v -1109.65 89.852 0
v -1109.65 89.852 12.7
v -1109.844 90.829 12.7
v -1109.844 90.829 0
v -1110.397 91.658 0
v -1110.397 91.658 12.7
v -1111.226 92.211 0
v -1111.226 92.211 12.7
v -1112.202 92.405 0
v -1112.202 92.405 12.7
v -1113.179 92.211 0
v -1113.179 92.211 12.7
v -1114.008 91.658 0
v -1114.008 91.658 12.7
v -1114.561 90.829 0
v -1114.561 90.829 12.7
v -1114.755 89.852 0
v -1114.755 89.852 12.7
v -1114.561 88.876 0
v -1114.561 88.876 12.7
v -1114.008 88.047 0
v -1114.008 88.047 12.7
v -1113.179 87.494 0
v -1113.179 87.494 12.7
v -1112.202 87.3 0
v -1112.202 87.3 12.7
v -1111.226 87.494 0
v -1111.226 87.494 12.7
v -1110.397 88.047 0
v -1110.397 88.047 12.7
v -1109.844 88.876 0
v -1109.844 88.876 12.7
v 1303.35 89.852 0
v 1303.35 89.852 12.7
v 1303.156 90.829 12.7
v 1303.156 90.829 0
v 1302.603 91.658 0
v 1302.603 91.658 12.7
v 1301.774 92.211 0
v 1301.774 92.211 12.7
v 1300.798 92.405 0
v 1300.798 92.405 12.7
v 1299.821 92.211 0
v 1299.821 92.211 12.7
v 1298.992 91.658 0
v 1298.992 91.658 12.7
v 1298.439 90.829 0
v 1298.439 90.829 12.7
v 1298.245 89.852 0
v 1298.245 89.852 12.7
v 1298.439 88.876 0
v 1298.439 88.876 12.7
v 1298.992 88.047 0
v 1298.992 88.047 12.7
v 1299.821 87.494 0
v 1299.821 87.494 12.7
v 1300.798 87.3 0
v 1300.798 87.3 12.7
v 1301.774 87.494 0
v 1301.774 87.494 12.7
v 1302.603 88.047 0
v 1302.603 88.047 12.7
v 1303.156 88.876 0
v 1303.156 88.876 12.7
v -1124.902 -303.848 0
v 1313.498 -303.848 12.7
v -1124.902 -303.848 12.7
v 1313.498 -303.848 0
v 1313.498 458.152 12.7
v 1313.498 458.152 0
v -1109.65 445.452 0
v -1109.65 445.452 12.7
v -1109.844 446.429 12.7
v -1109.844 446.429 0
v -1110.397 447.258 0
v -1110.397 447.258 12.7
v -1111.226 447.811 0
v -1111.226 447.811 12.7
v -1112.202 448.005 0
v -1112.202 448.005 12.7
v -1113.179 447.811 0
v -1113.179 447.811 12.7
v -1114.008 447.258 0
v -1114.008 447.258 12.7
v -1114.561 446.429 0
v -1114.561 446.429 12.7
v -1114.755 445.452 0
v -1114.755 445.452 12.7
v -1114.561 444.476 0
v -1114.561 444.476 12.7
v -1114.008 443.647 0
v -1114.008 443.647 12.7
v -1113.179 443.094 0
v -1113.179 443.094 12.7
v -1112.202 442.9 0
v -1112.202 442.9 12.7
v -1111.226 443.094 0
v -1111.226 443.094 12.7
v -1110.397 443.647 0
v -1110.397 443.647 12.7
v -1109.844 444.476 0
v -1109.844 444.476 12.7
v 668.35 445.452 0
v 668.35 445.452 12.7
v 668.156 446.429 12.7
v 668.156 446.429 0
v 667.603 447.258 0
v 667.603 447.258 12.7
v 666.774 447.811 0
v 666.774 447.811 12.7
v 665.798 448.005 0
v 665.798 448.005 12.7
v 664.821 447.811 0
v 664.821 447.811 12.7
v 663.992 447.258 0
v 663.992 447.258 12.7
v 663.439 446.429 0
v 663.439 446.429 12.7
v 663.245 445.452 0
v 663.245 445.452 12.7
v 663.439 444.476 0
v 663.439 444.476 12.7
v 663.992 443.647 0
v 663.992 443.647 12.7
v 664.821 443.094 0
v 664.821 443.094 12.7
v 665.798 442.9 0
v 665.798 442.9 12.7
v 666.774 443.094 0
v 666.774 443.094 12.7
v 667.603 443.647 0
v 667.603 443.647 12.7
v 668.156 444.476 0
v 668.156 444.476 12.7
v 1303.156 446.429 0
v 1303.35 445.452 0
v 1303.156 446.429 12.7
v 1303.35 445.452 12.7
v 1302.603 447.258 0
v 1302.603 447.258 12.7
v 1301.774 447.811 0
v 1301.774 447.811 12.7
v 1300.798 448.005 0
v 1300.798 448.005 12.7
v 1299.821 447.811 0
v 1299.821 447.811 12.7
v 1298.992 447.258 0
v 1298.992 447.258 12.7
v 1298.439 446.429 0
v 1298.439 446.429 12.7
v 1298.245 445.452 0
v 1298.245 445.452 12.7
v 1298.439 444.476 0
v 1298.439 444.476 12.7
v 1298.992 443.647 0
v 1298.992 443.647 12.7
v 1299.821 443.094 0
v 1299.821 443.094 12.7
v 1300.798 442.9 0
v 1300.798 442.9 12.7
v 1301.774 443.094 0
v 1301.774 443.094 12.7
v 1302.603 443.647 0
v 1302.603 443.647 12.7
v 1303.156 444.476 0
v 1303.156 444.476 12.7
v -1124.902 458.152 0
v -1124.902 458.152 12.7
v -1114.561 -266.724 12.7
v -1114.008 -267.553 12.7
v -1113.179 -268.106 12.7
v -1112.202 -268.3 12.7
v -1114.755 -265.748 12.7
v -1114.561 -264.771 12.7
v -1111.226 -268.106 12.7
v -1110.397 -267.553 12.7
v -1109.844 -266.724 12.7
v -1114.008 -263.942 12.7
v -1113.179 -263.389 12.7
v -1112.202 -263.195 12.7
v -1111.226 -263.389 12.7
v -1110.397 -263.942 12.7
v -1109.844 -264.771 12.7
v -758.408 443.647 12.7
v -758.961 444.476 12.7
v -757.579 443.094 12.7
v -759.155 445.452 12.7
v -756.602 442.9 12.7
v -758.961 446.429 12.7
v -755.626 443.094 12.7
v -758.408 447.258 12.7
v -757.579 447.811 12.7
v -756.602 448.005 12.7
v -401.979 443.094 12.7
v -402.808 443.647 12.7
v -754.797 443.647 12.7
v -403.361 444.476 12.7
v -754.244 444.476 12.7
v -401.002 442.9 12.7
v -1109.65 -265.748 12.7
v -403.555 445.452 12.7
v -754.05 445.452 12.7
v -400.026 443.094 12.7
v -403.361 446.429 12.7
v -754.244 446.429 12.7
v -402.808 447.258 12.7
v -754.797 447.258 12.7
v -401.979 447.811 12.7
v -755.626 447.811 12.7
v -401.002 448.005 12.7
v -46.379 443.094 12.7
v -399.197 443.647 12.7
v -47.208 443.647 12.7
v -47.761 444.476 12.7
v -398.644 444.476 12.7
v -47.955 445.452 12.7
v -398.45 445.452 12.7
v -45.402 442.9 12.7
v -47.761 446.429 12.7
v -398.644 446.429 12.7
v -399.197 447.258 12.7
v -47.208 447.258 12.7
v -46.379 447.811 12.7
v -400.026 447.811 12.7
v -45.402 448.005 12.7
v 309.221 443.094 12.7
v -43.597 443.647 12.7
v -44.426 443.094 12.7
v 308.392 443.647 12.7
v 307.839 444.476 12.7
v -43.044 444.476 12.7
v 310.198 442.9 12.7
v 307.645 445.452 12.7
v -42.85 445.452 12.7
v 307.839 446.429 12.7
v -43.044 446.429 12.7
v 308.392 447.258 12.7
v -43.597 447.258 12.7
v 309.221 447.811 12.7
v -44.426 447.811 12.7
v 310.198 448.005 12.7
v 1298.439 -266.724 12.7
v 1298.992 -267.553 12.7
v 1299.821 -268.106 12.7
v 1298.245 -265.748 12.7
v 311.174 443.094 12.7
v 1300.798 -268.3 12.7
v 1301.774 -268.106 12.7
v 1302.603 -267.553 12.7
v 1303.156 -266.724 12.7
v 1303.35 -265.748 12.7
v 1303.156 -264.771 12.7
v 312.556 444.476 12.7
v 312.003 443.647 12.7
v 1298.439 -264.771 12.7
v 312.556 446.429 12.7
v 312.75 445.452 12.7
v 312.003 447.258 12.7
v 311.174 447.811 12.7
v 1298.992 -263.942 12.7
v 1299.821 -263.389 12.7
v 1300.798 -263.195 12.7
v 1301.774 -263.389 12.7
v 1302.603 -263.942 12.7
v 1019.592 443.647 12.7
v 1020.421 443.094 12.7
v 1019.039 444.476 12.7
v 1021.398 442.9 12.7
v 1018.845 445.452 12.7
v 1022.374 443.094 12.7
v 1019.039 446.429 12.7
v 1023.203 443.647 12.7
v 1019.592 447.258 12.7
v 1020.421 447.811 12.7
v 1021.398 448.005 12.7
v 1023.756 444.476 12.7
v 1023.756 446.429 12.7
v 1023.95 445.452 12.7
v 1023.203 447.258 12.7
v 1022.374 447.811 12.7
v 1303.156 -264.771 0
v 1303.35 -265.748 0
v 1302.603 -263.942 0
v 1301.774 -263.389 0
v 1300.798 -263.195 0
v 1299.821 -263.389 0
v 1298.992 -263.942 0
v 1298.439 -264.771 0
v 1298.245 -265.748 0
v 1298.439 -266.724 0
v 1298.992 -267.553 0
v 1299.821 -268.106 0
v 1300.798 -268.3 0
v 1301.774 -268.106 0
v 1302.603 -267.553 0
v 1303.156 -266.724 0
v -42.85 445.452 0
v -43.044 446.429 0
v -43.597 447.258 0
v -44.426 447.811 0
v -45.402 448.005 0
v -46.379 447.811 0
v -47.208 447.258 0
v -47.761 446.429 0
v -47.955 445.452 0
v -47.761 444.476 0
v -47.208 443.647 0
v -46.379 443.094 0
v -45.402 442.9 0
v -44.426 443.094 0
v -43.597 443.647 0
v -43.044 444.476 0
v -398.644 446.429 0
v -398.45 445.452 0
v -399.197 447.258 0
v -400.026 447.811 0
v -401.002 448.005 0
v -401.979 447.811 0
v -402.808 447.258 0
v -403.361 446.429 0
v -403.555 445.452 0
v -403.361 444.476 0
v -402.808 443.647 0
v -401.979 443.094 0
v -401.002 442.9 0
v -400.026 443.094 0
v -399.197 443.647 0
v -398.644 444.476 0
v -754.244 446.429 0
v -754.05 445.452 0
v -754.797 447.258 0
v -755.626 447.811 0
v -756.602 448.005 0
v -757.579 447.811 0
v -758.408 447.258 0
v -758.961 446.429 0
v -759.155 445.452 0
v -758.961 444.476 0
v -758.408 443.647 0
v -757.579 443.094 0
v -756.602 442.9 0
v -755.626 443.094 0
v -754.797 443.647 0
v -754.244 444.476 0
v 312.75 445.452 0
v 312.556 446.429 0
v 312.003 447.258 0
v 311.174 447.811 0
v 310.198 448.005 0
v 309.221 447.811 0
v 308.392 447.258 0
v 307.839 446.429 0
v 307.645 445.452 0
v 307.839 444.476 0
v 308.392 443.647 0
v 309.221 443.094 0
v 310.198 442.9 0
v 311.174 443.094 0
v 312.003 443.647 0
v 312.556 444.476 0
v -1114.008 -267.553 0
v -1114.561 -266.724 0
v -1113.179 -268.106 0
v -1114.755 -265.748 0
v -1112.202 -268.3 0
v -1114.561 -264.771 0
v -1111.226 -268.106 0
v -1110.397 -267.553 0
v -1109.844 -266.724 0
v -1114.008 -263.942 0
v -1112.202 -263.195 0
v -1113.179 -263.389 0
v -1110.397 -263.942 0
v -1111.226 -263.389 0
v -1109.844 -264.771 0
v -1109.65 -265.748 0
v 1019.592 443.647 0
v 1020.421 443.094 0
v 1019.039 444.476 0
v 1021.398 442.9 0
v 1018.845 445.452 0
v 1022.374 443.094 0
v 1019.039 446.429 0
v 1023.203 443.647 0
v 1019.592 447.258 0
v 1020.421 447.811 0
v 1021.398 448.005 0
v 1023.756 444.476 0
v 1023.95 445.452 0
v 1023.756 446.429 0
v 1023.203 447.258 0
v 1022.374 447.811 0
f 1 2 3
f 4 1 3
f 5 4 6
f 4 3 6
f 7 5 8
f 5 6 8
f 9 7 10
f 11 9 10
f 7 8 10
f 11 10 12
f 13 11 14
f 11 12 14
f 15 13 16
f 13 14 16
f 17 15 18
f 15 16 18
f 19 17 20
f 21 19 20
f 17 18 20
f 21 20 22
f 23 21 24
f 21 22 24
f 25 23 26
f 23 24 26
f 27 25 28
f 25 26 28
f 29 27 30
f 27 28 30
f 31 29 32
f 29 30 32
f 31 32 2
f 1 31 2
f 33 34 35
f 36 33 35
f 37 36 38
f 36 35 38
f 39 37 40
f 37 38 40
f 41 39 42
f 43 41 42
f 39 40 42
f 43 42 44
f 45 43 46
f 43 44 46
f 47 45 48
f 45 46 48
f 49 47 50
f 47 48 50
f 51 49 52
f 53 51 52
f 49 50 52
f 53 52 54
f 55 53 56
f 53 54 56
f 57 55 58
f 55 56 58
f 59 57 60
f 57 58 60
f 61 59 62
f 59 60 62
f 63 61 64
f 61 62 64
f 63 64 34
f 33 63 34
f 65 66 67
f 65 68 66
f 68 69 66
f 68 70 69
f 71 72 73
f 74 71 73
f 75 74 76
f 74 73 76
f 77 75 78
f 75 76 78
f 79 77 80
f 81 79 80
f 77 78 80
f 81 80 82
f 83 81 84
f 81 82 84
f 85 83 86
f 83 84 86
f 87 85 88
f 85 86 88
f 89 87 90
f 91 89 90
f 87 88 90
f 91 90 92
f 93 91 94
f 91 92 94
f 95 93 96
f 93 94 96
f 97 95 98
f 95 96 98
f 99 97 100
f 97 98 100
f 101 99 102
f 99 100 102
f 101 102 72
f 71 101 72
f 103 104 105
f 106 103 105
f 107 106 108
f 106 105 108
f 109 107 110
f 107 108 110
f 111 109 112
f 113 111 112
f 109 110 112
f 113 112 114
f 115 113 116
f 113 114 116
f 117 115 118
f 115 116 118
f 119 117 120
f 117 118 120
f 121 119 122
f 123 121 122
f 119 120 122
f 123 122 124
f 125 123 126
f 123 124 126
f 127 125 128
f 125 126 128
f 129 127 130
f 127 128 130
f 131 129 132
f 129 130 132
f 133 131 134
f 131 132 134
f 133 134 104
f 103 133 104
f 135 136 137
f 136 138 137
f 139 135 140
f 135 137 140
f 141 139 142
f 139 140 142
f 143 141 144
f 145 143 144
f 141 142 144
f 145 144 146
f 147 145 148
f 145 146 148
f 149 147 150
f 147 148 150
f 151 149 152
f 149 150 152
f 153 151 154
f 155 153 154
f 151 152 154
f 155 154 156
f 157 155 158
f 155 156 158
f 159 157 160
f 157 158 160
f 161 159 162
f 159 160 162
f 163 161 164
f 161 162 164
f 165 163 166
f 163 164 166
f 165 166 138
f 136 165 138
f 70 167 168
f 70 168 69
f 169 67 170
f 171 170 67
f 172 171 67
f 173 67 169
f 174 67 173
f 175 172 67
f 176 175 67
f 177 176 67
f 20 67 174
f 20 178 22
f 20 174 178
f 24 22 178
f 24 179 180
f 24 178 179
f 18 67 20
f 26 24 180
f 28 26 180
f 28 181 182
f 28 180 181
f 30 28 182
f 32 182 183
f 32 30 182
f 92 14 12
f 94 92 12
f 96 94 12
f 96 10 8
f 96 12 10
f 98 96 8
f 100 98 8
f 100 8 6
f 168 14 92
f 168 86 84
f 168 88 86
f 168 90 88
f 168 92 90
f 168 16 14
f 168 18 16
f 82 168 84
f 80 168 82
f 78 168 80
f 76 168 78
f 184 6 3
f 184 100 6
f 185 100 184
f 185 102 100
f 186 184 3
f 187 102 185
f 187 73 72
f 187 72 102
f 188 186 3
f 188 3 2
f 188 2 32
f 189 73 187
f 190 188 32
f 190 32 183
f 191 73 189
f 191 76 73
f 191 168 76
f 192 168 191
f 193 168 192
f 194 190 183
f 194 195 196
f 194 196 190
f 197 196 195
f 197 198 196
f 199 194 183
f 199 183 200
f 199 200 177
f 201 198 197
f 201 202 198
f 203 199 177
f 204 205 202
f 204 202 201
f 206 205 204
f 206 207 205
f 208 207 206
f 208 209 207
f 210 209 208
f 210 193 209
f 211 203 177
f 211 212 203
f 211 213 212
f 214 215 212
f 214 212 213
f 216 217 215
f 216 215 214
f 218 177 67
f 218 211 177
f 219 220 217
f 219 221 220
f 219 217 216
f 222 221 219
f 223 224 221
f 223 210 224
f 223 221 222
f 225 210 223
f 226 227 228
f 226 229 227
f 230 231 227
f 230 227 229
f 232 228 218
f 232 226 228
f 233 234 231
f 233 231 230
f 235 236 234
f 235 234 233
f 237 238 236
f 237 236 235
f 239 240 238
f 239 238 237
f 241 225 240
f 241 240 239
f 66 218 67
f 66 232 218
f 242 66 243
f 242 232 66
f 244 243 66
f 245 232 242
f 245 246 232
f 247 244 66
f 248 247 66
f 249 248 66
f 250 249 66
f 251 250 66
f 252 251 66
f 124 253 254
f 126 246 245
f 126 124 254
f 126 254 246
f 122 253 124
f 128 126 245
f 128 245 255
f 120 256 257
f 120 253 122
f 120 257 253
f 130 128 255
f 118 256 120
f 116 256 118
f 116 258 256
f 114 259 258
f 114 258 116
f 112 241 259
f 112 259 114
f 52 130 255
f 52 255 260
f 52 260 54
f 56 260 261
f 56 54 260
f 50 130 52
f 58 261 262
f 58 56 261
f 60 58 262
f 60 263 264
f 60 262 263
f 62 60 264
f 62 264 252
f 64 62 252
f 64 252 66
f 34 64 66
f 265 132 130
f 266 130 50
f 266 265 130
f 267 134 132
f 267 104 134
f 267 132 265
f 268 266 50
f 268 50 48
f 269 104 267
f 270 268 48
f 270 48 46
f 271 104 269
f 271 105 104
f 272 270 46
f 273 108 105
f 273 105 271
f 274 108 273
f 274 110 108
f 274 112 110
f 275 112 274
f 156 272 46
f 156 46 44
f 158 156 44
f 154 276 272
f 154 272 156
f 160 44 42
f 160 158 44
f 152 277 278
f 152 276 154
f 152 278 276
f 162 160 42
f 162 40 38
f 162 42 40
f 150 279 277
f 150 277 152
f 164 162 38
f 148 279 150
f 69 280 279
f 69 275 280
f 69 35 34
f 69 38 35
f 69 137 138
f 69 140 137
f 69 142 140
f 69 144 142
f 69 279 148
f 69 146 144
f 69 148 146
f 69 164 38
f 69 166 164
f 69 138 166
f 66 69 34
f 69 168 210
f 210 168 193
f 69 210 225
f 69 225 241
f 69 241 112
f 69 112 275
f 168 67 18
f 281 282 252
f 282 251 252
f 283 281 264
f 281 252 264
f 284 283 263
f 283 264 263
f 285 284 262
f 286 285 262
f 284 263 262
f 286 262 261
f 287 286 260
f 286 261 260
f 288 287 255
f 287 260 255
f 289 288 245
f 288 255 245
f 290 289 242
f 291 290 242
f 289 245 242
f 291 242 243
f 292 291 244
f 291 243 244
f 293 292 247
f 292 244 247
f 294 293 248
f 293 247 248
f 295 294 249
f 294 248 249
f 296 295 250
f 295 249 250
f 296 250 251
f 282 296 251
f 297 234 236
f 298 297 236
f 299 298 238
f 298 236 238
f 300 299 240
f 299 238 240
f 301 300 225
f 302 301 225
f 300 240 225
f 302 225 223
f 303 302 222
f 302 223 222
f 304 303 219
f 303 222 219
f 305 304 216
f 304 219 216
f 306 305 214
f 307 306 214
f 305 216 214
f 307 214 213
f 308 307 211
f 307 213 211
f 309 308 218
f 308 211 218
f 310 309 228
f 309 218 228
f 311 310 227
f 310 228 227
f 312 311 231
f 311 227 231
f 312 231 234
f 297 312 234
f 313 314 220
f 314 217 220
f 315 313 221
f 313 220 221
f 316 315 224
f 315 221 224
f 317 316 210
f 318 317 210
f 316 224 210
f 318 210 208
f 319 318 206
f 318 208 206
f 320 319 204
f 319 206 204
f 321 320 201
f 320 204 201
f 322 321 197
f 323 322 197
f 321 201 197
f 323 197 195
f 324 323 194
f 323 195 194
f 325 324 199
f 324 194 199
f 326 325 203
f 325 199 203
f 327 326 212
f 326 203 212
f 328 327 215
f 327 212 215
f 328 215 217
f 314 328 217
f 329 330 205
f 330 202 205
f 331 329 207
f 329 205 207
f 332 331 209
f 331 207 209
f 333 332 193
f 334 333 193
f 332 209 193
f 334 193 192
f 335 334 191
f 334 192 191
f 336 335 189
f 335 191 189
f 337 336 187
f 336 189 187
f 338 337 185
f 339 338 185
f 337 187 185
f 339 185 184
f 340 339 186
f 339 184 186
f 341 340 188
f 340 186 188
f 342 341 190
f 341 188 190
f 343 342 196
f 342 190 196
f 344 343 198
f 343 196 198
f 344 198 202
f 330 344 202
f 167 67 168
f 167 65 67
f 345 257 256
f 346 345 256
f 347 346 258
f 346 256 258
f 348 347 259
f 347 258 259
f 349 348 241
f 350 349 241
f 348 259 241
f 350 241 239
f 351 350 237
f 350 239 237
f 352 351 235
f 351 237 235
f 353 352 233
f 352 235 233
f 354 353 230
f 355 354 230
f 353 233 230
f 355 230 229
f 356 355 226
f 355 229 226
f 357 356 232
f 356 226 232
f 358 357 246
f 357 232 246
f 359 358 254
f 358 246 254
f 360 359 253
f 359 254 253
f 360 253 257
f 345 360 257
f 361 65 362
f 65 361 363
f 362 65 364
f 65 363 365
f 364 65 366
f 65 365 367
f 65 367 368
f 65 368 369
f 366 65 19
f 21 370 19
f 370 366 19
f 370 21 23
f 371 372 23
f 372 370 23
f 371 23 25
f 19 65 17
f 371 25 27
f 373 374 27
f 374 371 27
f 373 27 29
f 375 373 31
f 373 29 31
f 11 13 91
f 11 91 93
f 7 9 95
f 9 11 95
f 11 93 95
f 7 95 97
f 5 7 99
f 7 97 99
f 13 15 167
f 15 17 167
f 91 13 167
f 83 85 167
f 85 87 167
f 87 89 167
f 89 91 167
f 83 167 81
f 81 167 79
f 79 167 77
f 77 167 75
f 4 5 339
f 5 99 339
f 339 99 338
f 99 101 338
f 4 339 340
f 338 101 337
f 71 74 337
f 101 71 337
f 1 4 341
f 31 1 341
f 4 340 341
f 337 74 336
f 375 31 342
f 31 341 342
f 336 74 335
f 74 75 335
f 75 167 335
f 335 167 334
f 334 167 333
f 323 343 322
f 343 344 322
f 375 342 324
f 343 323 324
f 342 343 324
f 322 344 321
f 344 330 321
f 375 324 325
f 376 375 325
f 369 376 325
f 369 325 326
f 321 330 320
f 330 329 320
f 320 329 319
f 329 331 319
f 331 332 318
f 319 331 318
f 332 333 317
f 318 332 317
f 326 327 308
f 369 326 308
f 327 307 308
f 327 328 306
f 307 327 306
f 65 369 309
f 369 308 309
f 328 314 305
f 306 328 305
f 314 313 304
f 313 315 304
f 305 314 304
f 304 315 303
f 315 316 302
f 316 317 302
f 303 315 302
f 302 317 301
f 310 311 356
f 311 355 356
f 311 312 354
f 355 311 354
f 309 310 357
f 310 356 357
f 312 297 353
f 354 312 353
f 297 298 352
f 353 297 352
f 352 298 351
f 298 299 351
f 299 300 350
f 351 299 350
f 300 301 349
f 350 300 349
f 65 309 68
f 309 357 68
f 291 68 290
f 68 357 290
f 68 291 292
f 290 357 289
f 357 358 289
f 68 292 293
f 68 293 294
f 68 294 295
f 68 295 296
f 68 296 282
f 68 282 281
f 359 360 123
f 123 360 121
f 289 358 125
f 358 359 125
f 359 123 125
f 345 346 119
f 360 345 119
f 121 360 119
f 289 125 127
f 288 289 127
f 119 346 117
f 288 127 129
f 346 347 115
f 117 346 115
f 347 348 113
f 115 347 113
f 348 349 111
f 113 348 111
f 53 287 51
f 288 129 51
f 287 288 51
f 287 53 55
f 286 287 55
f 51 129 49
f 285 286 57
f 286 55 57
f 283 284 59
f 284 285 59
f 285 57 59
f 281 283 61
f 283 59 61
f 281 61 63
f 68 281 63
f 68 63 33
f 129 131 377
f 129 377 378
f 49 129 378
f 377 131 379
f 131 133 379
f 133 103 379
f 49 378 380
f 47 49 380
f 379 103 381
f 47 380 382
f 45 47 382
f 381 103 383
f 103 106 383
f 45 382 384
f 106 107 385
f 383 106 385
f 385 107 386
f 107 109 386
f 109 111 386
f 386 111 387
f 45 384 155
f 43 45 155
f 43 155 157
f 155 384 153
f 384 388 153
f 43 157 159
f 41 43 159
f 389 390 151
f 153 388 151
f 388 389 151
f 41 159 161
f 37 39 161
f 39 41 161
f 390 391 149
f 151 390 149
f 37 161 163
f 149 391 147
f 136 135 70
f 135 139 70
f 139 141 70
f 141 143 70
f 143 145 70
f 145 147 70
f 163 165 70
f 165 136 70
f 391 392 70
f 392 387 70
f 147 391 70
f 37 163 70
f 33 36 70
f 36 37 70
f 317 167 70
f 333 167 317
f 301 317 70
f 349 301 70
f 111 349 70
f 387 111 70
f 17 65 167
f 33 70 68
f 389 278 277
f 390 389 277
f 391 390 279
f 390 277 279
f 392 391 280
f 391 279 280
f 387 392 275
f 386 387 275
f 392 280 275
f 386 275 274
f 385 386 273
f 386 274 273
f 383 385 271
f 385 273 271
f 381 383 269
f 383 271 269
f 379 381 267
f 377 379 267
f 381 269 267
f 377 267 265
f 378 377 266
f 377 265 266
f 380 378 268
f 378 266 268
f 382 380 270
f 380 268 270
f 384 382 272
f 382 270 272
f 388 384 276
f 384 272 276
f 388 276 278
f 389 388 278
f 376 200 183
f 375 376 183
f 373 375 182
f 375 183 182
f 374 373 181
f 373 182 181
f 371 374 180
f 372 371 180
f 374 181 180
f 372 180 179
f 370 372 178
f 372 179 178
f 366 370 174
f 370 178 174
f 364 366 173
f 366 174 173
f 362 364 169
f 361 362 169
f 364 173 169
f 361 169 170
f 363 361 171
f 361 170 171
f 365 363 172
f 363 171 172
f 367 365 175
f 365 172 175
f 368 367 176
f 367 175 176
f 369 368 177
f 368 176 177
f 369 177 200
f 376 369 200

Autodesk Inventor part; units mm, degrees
ref_plane "YZ Plane" through (0, 0, 0) normal (1, 0, 0) x (0, 1, 0)
ref_plane "XZ Plane" through (0, 0, 0) normal (0, 1, 0) x (-1, 0, 0)
ref_plane "XY Plane" through (0, 0, 0) normal (0, 0, 1) x (1, 0, 0)
sketch "Sketch1" plane through (0, 0, 0) normal (0, 0, 1) x (1, 0, 0)
  line L0 (-1124.9025, 458.1525) -> (1313.4975, 458.1525)
  line L1 (1313.4975, 458.1525) -> (1313.4975, -303.8475)
  line L2 (1313.4975, -303.8475) -> (-1124.9025, -303.8475)
  line L3 (-1124.9025, -303.8475) -> (-1124.9025, 458.1525)
  point P0 (0, 0)
  dimension "d0" = 2438.4
  dimension "d1" = 762
extrude "Extrusion1" add sketch "Sketch1" along normal blind 12.7
sketch "Sketch2" plane through (0, 0, 12.7) normal (0, 0, 1) x (1, 0, 0)
  circle A0 centre (-1112.2025, 445.4525) radius 2.5527
  line L0 (1313.4975, 458.1525) -> (-1124.9025, 458.1525) projected
  line L1 (-1124.9025, 458.1525) -> (-1124.9025, -303.8475) projected
  point P0 (0, 0)
  dimension "d4" = 5.1054
  dimension "d5" = 12.7
  dimension "d6" = 12.7
extrude "Extrusion2" cut sketch "Sketch2" against normal through all
pattern_linear "Rectangular Pattern1" count 3 spacing 355.6 along (0, -1, 0) of "Extrusion2"
pattern_linear "Rectangular Pattern2" count 8 spacing 355.6 along (1, 0, 0) of "Extrusion2"
pattern_linear "Rectangular Pattern3" count 2 spacing 2413 along (1, 0, 0) of "Extrusion2", "Rectangular Pattern1"
properties part number "Polycarb" material "Polycarbonate, Smoke"
